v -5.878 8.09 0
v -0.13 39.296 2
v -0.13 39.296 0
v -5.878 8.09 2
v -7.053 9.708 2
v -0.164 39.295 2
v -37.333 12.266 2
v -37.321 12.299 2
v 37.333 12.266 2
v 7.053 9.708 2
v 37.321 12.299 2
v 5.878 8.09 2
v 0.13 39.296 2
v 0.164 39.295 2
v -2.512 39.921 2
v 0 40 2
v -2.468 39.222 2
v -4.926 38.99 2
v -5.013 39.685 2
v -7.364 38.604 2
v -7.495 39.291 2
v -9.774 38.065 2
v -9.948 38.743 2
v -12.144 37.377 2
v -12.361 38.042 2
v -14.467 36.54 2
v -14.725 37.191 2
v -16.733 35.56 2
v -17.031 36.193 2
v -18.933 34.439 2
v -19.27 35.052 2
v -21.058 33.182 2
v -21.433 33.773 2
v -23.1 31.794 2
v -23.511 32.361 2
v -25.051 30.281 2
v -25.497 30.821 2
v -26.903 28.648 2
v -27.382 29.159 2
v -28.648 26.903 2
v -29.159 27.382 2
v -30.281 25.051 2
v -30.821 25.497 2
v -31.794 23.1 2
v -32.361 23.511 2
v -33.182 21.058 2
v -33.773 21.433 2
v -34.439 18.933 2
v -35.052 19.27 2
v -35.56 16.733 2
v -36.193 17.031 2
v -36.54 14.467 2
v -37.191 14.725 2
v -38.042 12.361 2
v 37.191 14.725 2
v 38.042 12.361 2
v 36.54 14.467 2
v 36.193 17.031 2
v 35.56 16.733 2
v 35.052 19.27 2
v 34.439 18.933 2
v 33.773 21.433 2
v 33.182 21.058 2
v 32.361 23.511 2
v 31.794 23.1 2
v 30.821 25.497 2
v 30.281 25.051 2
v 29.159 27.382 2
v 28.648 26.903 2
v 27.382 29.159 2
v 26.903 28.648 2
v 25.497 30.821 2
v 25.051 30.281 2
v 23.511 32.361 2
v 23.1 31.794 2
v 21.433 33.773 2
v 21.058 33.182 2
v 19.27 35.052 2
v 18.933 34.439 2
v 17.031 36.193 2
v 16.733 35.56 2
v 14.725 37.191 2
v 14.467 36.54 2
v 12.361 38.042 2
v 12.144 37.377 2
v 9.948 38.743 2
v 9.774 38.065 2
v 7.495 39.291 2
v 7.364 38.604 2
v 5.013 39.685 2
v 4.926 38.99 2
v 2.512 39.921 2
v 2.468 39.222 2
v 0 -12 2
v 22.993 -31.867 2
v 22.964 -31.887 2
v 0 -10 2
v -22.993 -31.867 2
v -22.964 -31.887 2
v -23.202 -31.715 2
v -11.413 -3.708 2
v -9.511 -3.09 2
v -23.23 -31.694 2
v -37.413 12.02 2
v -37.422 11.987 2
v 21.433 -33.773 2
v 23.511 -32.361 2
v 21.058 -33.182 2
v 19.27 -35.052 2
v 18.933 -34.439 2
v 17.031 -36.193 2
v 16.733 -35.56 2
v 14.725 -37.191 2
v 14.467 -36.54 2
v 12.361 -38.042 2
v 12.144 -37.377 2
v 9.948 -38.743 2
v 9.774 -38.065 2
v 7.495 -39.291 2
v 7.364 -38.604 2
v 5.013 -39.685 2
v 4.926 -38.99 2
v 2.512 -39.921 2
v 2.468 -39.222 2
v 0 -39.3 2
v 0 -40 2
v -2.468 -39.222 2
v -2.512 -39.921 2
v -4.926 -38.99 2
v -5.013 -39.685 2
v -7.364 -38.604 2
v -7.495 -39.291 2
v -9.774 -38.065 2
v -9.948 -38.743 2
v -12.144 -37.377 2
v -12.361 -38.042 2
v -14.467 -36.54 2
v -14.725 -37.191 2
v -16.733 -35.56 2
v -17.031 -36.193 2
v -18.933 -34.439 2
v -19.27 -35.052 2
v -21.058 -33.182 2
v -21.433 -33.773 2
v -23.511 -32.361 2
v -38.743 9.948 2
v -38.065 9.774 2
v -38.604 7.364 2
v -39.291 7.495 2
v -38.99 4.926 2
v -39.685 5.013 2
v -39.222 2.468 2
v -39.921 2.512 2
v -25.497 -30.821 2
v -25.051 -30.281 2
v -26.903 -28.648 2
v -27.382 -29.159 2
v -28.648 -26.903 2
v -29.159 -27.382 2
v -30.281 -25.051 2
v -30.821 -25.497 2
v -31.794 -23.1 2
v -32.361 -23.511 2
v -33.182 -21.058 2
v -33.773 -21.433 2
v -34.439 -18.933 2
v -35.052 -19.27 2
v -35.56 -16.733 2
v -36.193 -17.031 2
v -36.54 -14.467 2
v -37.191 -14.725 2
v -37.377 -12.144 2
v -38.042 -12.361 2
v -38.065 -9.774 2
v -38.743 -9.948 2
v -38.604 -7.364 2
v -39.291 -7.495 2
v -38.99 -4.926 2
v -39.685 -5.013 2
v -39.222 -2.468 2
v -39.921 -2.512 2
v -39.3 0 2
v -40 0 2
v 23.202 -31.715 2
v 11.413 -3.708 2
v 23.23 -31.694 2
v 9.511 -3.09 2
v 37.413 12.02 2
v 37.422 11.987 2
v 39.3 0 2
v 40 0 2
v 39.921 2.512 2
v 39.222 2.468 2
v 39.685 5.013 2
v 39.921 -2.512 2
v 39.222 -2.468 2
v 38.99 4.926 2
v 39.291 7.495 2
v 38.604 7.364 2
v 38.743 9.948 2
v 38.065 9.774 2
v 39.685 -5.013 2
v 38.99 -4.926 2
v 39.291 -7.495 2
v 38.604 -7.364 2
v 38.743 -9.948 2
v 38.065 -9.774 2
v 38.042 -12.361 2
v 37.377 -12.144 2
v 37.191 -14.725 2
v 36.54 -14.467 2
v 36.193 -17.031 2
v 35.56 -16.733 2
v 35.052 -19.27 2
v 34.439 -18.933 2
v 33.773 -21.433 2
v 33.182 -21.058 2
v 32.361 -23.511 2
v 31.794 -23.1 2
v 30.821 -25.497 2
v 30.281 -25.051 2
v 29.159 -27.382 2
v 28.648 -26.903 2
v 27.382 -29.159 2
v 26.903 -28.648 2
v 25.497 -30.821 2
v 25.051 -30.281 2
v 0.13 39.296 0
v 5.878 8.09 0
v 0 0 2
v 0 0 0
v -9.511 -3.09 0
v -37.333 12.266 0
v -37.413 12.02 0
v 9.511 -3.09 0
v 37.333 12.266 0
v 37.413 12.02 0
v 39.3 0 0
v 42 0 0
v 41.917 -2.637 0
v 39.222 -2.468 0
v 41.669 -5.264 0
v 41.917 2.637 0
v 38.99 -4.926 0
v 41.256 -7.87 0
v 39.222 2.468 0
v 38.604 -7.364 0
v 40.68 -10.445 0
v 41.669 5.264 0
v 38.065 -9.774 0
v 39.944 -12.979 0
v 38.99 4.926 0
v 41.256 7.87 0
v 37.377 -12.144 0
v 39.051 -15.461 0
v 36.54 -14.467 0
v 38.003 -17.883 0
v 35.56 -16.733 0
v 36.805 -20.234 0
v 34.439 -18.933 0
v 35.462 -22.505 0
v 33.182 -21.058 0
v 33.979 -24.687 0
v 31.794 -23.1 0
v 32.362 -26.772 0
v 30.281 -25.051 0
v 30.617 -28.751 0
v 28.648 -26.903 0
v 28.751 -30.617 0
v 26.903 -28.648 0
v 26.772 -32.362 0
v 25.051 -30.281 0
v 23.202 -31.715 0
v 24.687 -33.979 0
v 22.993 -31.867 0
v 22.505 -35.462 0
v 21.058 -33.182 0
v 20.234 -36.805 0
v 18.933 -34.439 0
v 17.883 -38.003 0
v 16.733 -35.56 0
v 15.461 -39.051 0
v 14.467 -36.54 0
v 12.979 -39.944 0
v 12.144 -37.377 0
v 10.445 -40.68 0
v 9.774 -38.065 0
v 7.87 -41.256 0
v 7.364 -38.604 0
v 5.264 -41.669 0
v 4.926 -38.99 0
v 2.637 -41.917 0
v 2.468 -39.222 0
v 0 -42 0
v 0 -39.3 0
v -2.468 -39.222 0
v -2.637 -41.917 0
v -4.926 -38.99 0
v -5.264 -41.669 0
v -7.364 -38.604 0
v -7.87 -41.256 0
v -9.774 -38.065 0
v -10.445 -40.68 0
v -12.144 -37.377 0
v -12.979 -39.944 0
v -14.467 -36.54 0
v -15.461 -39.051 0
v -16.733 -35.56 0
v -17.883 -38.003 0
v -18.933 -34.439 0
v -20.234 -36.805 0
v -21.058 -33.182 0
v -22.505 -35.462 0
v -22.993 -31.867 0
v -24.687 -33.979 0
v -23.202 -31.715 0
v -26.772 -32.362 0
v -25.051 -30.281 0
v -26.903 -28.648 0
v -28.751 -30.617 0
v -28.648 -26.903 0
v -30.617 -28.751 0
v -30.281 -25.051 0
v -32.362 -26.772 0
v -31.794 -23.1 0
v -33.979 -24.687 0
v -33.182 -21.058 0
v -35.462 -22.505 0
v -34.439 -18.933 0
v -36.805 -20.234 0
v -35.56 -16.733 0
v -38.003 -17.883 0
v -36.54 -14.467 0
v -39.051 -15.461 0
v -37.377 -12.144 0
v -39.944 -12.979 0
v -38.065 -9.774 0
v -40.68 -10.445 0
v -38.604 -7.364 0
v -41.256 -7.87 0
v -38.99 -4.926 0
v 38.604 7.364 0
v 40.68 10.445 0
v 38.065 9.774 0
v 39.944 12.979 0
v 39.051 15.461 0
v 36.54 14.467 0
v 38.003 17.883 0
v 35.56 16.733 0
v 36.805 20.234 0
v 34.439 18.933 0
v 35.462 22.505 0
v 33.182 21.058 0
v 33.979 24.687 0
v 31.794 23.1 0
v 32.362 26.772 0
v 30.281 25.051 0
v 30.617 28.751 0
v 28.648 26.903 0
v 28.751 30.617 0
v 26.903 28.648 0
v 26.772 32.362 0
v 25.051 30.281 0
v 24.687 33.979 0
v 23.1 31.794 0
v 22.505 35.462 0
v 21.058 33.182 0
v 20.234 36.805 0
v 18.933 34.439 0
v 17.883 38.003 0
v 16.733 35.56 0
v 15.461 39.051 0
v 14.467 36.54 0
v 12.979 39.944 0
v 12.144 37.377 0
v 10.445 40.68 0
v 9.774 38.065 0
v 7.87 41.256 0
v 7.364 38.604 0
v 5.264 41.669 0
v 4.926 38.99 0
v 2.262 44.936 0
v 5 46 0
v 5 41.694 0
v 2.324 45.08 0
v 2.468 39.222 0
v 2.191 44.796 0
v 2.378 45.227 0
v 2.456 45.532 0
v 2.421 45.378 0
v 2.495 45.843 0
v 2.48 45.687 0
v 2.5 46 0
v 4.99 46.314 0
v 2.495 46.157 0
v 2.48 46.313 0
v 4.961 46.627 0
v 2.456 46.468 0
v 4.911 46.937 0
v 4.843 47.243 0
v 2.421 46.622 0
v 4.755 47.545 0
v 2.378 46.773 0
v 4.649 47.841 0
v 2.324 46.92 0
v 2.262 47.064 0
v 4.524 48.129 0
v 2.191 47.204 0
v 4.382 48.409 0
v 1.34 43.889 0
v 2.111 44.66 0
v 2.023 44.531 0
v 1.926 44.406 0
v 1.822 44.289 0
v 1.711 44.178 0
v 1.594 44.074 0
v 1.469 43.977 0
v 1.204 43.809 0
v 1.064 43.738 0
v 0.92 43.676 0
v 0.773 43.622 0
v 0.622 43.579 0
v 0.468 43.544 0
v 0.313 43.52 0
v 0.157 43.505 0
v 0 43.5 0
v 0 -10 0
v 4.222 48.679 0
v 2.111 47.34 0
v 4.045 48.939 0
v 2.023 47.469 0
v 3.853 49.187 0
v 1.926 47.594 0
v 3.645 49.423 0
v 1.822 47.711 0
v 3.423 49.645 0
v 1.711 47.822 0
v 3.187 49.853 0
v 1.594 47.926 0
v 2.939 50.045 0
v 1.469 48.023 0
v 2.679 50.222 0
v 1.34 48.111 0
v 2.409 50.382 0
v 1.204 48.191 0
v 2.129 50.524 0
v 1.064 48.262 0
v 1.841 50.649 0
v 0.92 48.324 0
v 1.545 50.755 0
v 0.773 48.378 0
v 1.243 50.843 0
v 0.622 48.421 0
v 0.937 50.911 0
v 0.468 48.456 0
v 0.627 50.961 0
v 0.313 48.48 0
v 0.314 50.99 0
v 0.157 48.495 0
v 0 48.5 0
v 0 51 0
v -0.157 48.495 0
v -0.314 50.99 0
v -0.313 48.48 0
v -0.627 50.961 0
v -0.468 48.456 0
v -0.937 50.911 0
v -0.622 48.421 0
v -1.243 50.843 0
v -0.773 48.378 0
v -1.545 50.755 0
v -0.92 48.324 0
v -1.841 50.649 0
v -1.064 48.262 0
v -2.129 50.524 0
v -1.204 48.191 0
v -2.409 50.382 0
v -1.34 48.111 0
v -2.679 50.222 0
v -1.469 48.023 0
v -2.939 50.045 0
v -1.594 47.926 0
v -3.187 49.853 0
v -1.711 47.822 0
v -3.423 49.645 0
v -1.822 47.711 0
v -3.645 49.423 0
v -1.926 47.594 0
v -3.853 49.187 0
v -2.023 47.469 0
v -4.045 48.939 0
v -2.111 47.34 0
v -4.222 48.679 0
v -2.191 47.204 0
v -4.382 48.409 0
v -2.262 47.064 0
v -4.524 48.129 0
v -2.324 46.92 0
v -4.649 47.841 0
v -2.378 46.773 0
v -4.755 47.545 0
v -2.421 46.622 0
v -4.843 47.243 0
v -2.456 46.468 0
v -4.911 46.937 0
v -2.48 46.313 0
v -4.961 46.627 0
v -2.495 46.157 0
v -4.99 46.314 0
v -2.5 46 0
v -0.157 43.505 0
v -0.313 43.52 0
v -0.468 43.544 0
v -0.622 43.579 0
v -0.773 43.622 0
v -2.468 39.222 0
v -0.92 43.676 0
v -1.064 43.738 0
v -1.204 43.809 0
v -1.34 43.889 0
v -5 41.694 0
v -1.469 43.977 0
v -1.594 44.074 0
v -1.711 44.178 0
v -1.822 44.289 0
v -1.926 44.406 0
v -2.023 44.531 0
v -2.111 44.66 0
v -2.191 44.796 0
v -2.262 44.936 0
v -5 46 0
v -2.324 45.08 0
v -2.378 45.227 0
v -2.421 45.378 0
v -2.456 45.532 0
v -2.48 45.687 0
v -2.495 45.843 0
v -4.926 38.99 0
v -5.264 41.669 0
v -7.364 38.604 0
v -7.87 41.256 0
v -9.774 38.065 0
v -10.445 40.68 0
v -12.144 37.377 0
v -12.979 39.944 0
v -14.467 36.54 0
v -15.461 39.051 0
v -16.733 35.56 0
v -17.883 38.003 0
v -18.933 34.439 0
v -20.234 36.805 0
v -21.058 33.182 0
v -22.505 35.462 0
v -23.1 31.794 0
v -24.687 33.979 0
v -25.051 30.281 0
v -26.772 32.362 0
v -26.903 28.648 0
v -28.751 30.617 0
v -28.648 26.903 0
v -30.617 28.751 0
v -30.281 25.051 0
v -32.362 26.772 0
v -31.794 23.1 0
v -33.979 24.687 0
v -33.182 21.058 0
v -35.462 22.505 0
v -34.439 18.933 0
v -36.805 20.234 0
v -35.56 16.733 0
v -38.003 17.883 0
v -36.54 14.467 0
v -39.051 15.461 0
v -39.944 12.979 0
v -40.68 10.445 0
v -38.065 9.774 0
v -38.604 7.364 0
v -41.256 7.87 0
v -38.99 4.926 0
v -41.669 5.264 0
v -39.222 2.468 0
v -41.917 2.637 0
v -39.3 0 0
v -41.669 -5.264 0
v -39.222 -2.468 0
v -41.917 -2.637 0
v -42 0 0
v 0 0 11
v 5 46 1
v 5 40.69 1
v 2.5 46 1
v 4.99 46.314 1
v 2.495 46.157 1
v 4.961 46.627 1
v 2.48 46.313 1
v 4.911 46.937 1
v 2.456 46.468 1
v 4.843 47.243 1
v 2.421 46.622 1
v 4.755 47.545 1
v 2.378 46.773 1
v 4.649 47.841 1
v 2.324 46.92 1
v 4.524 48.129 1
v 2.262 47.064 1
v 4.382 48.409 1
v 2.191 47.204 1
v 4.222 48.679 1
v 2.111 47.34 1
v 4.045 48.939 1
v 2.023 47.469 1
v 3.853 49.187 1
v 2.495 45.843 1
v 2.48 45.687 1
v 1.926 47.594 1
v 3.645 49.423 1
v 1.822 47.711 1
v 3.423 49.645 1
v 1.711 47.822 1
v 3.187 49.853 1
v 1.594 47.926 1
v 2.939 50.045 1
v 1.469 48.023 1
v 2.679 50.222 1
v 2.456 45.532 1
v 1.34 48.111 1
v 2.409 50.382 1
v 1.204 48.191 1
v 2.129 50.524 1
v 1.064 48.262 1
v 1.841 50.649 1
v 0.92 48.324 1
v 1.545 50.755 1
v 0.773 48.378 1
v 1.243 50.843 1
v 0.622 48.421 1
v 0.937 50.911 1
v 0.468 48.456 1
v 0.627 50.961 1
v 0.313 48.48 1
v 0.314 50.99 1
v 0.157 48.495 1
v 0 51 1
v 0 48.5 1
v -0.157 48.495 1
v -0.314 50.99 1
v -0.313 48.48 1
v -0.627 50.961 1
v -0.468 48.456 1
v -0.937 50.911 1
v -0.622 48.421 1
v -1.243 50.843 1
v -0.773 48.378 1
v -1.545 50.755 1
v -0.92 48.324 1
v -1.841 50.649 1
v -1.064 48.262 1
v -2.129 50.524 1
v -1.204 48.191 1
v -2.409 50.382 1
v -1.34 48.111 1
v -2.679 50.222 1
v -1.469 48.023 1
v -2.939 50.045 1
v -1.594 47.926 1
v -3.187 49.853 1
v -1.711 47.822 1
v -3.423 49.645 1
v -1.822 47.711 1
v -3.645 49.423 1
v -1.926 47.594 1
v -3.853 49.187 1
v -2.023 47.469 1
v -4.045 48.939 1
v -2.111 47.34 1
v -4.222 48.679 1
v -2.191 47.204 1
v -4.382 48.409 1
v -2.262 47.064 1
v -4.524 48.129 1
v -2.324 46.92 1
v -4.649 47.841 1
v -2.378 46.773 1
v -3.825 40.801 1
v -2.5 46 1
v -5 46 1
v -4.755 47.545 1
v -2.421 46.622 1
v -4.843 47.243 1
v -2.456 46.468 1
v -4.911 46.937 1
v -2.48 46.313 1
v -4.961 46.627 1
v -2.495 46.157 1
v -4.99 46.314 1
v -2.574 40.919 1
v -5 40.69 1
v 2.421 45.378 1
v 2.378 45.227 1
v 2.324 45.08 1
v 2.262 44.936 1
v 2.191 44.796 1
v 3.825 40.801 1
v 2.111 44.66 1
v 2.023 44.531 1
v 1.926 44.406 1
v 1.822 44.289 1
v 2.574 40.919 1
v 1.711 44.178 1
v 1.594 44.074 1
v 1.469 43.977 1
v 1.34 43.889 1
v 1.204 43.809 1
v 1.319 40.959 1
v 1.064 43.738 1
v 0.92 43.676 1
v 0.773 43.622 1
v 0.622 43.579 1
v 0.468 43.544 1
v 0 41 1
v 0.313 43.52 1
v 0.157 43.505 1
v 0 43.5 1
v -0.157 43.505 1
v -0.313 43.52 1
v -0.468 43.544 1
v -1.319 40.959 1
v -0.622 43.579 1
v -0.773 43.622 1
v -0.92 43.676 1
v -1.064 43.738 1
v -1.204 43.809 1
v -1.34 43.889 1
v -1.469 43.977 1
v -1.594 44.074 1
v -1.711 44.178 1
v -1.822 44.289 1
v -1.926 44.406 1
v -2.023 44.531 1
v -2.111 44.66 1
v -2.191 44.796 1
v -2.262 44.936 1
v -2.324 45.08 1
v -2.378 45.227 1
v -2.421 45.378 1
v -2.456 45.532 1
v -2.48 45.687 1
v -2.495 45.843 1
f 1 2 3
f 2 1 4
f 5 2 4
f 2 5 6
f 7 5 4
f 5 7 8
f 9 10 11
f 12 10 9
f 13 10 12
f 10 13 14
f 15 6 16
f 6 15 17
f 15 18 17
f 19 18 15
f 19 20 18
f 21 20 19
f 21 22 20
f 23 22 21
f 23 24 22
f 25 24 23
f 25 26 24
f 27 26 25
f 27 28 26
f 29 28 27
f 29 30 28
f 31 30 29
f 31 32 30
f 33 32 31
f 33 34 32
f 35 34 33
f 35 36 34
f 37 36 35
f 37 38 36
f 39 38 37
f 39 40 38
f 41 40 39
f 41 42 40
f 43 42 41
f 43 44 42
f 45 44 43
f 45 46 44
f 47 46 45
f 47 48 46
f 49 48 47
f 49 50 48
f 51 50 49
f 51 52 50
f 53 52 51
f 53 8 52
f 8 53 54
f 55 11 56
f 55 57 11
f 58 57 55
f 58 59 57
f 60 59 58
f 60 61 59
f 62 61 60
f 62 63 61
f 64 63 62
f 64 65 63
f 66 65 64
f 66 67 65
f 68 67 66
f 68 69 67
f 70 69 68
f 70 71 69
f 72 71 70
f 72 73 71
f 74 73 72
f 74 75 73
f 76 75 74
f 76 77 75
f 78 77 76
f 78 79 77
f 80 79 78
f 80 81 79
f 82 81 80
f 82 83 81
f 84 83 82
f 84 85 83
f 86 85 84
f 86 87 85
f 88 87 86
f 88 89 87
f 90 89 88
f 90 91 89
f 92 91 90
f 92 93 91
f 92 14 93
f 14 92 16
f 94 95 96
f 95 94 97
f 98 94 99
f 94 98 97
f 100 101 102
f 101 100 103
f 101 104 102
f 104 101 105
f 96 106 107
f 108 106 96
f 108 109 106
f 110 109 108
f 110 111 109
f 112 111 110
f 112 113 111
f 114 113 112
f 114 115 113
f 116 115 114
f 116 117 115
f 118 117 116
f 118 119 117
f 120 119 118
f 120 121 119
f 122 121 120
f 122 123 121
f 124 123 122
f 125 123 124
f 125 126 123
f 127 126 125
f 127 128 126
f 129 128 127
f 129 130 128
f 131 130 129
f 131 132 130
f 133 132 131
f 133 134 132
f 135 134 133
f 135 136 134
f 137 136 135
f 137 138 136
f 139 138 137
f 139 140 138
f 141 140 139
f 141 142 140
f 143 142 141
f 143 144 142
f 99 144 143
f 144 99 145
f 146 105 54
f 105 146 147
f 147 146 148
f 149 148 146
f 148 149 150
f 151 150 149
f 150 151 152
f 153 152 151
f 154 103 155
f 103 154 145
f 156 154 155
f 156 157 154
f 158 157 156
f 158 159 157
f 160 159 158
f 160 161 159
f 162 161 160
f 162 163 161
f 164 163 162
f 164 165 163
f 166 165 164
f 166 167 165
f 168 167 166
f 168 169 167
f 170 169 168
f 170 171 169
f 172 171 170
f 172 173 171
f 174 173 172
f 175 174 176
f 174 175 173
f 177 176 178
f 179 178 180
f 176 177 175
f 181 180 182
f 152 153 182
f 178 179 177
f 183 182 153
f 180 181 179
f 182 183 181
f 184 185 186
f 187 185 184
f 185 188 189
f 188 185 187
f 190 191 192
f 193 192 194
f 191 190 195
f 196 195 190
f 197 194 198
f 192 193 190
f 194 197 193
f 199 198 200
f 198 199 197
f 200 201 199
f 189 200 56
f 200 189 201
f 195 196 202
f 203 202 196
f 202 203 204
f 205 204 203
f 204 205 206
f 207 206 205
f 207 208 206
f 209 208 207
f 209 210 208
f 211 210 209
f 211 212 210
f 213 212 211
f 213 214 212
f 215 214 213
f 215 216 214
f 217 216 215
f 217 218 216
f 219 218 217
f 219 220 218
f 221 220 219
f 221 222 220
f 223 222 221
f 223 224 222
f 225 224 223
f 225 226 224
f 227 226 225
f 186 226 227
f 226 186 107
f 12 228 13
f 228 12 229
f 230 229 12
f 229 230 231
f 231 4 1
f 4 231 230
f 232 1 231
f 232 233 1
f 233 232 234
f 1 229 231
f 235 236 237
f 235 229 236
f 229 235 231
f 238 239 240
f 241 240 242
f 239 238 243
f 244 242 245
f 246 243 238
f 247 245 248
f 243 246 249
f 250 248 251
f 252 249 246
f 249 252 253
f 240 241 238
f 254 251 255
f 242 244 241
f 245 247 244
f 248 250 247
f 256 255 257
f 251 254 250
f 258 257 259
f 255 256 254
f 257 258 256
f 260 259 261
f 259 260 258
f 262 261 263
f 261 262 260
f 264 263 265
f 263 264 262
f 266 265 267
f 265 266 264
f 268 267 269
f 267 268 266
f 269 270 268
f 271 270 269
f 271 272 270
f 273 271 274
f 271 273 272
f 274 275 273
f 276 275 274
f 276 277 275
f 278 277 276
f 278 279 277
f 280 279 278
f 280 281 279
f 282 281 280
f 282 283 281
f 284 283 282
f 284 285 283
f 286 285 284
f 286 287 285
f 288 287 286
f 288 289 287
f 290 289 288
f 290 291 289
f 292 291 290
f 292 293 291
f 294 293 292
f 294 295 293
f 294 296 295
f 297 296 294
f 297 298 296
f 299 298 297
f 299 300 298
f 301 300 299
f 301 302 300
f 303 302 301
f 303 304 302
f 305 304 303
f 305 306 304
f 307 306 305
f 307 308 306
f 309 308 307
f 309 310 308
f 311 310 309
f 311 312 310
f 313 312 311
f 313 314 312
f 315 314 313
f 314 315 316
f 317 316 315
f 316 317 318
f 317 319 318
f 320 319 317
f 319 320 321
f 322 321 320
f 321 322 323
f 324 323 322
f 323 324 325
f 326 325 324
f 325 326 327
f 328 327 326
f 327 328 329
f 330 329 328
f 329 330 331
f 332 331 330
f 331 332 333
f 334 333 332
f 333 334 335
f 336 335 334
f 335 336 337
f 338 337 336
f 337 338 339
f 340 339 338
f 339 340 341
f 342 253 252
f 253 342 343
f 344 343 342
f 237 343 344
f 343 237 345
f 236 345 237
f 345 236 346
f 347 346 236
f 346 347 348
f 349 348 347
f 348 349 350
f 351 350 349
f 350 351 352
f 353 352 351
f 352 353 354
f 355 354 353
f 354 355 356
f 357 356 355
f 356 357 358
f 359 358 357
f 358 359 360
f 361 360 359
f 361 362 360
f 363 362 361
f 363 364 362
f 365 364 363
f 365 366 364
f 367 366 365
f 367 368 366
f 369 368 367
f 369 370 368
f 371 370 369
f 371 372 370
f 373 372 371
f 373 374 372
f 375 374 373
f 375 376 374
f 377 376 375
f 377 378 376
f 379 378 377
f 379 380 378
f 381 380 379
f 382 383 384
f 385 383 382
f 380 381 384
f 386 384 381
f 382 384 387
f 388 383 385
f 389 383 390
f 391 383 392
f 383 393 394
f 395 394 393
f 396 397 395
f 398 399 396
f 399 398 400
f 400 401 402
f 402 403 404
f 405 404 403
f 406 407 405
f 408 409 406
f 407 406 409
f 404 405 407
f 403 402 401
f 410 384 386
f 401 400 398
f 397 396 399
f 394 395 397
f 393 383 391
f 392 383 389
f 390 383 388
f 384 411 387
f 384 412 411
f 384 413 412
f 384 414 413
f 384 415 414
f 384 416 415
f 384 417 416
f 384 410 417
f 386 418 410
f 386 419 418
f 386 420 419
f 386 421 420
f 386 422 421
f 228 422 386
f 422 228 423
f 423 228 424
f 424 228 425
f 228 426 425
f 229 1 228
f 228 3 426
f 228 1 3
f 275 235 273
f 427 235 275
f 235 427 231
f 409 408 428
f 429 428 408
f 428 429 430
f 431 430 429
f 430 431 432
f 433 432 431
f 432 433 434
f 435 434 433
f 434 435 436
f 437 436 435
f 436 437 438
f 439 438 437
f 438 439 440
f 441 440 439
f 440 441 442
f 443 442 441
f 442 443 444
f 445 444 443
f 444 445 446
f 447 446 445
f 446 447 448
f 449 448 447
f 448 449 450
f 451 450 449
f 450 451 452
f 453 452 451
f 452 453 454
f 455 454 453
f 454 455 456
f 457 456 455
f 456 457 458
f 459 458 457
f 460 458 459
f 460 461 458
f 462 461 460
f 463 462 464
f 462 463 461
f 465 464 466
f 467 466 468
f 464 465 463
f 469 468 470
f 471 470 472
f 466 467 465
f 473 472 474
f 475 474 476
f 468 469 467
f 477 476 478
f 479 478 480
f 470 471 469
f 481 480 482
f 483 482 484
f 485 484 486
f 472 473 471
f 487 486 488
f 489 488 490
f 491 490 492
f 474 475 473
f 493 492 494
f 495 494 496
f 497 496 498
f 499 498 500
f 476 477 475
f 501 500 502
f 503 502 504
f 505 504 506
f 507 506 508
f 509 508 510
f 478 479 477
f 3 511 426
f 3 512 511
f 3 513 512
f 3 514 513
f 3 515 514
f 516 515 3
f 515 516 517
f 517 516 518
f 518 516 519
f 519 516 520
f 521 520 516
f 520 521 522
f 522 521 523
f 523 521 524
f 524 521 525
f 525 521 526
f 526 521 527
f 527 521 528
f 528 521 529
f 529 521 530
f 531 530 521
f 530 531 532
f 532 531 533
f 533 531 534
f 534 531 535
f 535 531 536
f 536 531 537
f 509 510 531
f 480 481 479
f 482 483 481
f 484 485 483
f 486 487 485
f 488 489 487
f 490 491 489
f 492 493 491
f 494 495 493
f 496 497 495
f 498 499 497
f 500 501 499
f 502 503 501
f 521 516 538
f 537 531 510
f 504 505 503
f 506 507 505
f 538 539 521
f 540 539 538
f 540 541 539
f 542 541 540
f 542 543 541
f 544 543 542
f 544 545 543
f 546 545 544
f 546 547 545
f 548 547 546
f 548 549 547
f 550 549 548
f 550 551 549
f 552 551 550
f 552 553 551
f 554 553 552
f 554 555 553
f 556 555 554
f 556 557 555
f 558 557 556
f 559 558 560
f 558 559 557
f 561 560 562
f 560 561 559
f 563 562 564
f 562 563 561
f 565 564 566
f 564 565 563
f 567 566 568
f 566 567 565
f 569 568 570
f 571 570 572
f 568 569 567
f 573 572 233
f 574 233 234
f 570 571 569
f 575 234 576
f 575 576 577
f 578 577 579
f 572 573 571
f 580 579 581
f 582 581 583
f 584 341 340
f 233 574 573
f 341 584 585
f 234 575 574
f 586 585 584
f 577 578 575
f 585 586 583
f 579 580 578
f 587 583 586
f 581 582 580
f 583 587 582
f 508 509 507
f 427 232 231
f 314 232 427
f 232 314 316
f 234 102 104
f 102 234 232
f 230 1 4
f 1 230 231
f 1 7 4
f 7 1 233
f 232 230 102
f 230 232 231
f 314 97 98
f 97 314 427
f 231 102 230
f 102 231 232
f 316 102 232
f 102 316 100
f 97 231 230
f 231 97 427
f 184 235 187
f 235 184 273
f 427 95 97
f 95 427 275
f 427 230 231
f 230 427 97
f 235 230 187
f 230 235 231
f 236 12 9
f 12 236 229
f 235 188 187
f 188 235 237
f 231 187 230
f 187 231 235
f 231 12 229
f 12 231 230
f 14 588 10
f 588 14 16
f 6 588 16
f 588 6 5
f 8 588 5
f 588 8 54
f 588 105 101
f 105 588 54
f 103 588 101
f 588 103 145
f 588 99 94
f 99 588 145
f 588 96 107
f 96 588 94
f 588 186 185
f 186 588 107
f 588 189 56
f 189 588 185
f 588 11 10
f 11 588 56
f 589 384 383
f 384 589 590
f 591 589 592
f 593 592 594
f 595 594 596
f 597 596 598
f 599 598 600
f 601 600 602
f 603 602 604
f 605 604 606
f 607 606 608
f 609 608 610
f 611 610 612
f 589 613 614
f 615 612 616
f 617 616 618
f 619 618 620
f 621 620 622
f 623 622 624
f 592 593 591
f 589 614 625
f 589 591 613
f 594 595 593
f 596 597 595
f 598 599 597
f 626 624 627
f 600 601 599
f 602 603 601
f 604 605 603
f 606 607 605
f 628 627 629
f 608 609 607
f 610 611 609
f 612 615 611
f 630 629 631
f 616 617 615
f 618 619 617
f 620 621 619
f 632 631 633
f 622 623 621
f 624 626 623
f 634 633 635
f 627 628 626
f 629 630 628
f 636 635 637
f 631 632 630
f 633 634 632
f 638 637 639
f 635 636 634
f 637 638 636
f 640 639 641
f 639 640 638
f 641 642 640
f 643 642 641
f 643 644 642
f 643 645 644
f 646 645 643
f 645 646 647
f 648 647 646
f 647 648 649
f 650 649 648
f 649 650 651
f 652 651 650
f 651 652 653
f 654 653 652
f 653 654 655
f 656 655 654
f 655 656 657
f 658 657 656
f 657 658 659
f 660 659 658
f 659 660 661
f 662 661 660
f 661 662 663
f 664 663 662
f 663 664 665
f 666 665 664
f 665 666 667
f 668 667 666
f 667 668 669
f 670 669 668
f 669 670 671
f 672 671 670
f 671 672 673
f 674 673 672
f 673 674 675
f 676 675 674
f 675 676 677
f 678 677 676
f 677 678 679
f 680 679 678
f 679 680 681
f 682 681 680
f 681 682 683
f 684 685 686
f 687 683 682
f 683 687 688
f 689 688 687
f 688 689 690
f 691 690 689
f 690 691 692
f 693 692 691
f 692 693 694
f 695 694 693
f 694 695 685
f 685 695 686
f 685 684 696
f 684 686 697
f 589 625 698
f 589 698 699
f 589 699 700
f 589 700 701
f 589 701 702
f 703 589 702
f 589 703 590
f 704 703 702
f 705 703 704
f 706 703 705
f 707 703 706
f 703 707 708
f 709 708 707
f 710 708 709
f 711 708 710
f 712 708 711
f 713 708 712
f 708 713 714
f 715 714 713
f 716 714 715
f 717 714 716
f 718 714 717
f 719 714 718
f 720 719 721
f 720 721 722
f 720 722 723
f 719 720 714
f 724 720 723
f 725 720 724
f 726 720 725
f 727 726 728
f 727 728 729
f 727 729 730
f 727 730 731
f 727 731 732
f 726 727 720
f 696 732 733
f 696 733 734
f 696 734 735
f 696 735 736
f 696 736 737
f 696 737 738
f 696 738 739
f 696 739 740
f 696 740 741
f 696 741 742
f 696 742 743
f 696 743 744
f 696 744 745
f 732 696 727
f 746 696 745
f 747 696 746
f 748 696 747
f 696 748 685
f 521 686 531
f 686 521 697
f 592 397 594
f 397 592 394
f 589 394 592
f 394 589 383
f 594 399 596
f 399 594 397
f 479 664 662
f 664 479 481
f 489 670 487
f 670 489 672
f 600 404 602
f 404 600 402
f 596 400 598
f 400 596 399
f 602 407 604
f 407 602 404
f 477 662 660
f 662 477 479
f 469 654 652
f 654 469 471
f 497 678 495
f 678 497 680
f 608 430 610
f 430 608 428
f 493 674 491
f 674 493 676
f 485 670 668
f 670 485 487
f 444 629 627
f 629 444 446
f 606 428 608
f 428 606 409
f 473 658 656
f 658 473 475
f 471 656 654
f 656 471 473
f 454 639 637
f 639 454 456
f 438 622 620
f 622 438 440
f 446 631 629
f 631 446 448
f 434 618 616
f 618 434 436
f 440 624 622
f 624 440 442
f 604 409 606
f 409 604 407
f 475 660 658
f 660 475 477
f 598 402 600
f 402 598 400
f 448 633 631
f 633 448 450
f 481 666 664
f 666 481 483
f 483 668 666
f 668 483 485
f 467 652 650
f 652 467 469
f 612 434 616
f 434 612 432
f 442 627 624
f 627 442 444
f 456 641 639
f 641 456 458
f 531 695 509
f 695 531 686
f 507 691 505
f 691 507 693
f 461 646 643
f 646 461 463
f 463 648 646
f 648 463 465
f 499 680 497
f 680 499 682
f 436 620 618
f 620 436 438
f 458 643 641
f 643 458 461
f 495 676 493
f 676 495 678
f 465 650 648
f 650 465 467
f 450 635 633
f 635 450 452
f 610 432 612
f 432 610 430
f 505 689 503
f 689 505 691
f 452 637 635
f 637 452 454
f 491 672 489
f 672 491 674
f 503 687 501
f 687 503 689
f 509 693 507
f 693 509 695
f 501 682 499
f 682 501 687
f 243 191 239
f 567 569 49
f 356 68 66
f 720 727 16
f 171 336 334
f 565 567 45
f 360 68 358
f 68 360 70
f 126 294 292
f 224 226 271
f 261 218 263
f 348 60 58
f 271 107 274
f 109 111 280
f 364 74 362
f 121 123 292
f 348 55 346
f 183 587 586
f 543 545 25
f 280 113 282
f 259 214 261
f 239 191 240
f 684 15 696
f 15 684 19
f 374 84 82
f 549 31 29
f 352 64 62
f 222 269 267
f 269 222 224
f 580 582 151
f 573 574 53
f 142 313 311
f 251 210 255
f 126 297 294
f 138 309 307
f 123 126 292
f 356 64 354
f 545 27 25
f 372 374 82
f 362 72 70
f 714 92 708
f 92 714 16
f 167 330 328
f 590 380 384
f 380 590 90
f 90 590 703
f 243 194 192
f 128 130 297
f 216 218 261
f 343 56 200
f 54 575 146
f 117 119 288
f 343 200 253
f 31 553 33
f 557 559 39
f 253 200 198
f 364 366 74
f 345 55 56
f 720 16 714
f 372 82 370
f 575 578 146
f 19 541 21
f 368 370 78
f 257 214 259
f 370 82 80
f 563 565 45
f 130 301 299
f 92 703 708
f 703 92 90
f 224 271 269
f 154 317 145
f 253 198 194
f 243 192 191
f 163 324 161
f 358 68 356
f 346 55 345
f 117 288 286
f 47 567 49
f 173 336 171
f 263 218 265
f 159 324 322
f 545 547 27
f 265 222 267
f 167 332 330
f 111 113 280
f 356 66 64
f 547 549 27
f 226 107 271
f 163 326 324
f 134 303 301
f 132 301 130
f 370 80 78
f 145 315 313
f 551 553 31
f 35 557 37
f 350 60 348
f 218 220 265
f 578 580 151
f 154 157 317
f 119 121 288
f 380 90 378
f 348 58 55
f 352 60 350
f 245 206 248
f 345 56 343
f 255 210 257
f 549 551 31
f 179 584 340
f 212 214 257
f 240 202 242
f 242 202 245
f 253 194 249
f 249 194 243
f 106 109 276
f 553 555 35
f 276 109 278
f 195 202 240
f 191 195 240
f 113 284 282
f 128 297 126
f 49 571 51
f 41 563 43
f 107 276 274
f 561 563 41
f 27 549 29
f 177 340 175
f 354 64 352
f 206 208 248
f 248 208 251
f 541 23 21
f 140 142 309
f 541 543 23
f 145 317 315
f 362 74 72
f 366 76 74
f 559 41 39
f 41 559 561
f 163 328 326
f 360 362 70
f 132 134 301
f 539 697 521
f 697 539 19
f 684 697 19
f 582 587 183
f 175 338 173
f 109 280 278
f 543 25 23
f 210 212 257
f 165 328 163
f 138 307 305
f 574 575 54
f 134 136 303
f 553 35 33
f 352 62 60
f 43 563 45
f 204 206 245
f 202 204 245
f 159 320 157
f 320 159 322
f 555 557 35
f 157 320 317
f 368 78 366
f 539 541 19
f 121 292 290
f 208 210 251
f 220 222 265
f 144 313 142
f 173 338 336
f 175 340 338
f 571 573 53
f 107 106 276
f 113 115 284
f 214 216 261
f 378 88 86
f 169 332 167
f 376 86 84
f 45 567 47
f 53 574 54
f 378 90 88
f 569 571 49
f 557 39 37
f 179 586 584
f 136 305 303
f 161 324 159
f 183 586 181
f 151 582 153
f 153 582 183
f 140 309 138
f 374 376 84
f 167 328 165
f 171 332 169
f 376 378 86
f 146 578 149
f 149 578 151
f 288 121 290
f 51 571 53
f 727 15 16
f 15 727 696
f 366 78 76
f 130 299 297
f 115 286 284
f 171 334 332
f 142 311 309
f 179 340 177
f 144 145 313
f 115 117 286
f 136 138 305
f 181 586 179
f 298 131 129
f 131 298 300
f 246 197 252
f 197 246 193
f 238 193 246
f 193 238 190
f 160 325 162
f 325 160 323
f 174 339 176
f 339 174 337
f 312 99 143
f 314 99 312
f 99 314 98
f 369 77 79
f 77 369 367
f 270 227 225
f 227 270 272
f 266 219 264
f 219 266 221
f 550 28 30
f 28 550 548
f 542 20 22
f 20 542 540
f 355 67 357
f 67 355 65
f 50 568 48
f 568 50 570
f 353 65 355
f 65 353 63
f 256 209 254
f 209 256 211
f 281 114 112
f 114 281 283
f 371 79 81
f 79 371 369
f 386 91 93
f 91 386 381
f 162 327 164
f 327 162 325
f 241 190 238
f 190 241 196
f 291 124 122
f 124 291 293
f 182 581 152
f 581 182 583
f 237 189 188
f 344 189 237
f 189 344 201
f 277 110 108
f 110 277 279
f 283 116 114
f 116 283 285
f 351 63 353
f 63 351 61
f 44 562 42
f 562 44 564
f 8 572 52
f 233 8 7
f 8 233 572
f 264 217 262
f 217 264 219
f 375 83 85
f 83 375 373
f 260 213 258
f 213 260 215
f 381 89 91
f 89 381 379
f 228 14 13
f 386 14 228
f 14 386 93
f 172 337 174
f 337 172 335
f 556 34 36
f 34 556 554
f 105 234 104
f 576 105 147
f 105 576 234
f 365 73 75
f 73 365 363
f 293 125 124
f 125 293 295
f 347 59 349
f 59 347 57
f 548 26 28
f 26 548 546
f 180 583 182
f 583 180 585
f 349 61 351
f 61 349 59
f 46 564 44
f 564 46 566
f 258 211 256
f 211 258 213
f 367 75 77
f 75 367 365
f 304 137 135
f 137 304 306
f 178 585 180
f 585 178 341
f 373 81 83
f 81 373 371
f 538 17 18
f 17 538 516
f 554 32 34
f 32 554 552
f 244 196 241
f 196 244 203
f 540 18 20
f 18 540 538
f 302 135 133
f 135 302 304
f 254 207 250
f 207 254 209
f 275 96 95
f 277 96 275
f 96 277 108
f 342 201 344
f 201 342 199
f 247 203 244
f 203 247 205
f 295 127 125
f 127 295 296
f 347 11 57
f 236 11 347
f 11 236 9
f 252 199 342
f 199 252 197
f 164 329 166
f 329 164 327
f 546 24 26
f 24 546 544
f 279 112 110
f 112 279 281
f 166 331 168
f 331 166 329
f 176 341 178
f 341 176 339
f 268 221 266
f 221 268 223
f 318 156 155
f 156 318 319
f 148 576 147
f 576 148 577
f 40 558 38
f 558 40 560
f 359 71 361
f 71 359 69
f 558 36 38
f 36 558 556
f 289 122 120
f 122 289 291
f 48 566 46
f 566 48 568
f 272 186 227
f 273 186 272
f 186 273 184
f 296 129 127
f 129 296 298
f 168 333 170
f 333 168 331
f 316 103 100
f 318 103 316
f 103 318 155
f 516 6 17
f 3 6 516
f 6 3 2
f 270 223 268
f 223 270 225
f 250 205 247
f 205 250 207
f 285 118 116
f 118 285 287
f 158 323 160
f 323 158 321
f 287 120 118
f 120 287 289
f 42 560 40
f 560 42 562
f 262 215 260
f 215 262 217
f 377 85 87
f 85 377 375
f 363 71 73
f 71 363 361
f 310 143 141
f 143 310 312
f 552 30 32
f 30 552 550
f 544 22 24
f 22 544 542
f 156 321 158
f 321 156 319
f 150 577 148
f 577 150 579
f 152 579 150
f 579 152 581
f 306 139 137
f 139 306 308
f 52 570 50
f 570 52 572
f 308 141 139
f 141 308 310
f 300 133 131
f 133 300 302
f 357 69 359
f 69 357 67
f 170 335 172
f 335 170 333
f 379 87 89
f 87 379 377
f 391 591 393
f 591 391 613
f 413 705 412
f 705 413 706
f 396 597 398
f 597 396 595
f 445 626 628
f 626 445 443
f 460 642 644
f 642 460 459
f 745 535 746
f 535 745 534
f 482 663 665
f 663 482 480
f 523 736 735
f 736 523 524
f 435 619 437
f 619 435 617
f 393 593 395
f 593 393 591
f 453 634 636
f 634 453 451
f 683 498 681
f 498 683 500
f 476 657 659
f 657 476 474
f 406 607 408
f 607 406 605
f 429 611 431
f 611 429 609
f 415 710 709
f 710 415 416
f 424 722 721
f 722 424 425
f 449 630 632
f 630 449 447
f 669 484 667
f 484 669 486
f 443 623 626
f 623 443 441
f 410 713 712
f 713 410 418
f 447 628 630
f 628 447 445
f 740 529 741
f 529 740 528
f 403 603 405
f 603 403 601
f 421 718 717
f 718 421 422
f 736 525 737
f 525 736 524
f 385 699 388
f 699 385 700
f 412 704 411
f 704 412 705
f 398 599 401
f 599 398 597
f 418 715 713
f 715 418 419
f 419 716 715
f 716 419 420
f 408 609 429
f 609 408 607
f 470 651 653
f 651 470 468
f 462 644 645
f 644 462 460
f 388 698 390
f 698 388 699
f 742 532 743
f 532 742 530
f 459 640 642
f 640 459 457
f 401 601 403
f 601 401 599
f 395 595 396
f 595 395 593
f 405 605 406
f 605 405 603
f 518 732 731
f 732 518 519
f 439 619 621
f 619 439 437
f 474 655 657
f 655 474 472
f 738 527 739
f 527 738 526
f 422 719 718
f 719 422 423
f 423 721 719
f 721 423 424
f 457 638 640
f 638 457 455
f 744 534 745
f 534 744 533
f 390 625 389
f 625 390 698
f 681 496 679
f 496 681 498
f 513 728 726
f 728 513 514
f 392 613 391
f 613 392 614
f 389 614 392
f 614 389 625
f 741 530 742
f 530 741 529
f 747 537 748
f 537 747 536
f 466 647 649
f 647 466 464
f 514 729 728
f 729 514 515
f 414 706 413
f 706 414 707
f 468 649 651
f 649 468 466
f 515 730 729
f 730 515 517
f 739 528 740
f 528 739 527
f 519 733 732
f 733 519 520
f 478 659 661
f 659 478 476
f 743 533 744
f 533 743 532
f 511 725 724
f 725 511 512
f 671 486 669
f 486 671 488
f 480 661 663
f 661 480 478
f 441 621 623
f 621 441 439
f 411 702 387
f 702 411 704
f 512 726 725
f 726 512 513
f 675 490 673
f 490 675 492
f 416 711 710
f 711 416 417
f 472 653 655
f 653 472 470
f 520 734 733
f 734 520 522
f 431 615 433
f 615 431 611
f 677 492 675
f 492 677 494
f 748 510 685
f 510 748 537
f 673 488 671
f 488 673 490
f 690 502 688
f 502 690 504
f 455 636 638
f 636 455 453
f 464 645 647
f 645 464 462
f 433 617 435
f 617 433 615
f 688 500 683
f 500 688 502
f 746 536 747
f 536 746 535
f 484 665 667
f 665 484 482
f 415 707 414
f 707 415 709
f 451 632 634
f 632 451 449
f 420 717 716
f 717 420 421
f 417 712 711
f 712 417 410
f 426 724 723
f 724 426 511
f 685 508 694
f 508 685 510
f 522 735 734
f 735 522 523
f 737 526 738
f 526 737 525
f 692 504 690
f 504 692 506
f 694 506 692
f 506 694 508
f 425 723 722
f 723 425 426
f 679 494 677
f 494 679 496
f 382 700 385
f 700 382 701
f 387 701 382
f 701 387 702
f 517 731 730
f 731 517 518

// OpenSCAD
$fn = 100;
base_thk = 2;

module ring() {
    difference() {
        circle(r=20);
        circle(r=18.5);
    }
}

module tri() {
   r = 12;
   ht = 9;
   xa = r * sin(36);
   ya = r * cos(36);
   polyhedron([ [0, 0, 0],
                [xa, ya, 0],
                [0, 40, 0],
                [-xa, ya, 0],
                [0, 0, ht] 
           ], faces = [[3, 0, 1, 2],
                       [0, 4, 1],
                       [0, 3, 4],
                       [1, 4, 2] ,
                       [2, 4, 3] ], convexity=10 );
}

module tribase() {
   r = 10;
   ht = 9;
   thk = 0.4;
   xa = r * sin(36);
   ya = r * cos(36);
   linear_extrude(base_thk) {
   polygon([ [0, 0],
                [xa, ya],
                [0, 40],
                [-xa, ya], 
           ], paths = [[3, 0, 1, 2]]);
   }
}


module star() {
    for (i = [0: 72: 359]) {
        rotate([0, 0, i]) tri();
    }
    
}

module starbase() {
    //linear_extrude(0.2) {
        for (i = [0: 72: 359]) {
            rotate([0, 0, i]) tribase();
        }
    //}
    
}

module tab() {
    difference() {
        union() {
            translate([0, 2.5]) circle(r=2.5, center=true);
            square(5, center=true);
        }
        translate([0, 2.5]) circle(r=1.4);
    }
}


module frame() {
    difference() {
        union() {
            translate([-5, 39, 0]) cube([10, 7, 1]); //tab
            translate([0, 46, 0]) cylinder(h=1, r=5); //tab round
            cylinder(h=base_thk, r1=42, r2=40); //38); //basic ring
        }
        translate([0, 0, -1]) cylinder(h=10, r=39.3);
        //translate([0, 0, base_thk]) cylinder(h=2, r1=39.5, r2=40.5);
        translate([0, 46, -1]) cylinder(h=10, r=2.5); // tab hole
    }
}
//tri();
starbase();
translate([0, 0, base_thk]) star();
frame();
